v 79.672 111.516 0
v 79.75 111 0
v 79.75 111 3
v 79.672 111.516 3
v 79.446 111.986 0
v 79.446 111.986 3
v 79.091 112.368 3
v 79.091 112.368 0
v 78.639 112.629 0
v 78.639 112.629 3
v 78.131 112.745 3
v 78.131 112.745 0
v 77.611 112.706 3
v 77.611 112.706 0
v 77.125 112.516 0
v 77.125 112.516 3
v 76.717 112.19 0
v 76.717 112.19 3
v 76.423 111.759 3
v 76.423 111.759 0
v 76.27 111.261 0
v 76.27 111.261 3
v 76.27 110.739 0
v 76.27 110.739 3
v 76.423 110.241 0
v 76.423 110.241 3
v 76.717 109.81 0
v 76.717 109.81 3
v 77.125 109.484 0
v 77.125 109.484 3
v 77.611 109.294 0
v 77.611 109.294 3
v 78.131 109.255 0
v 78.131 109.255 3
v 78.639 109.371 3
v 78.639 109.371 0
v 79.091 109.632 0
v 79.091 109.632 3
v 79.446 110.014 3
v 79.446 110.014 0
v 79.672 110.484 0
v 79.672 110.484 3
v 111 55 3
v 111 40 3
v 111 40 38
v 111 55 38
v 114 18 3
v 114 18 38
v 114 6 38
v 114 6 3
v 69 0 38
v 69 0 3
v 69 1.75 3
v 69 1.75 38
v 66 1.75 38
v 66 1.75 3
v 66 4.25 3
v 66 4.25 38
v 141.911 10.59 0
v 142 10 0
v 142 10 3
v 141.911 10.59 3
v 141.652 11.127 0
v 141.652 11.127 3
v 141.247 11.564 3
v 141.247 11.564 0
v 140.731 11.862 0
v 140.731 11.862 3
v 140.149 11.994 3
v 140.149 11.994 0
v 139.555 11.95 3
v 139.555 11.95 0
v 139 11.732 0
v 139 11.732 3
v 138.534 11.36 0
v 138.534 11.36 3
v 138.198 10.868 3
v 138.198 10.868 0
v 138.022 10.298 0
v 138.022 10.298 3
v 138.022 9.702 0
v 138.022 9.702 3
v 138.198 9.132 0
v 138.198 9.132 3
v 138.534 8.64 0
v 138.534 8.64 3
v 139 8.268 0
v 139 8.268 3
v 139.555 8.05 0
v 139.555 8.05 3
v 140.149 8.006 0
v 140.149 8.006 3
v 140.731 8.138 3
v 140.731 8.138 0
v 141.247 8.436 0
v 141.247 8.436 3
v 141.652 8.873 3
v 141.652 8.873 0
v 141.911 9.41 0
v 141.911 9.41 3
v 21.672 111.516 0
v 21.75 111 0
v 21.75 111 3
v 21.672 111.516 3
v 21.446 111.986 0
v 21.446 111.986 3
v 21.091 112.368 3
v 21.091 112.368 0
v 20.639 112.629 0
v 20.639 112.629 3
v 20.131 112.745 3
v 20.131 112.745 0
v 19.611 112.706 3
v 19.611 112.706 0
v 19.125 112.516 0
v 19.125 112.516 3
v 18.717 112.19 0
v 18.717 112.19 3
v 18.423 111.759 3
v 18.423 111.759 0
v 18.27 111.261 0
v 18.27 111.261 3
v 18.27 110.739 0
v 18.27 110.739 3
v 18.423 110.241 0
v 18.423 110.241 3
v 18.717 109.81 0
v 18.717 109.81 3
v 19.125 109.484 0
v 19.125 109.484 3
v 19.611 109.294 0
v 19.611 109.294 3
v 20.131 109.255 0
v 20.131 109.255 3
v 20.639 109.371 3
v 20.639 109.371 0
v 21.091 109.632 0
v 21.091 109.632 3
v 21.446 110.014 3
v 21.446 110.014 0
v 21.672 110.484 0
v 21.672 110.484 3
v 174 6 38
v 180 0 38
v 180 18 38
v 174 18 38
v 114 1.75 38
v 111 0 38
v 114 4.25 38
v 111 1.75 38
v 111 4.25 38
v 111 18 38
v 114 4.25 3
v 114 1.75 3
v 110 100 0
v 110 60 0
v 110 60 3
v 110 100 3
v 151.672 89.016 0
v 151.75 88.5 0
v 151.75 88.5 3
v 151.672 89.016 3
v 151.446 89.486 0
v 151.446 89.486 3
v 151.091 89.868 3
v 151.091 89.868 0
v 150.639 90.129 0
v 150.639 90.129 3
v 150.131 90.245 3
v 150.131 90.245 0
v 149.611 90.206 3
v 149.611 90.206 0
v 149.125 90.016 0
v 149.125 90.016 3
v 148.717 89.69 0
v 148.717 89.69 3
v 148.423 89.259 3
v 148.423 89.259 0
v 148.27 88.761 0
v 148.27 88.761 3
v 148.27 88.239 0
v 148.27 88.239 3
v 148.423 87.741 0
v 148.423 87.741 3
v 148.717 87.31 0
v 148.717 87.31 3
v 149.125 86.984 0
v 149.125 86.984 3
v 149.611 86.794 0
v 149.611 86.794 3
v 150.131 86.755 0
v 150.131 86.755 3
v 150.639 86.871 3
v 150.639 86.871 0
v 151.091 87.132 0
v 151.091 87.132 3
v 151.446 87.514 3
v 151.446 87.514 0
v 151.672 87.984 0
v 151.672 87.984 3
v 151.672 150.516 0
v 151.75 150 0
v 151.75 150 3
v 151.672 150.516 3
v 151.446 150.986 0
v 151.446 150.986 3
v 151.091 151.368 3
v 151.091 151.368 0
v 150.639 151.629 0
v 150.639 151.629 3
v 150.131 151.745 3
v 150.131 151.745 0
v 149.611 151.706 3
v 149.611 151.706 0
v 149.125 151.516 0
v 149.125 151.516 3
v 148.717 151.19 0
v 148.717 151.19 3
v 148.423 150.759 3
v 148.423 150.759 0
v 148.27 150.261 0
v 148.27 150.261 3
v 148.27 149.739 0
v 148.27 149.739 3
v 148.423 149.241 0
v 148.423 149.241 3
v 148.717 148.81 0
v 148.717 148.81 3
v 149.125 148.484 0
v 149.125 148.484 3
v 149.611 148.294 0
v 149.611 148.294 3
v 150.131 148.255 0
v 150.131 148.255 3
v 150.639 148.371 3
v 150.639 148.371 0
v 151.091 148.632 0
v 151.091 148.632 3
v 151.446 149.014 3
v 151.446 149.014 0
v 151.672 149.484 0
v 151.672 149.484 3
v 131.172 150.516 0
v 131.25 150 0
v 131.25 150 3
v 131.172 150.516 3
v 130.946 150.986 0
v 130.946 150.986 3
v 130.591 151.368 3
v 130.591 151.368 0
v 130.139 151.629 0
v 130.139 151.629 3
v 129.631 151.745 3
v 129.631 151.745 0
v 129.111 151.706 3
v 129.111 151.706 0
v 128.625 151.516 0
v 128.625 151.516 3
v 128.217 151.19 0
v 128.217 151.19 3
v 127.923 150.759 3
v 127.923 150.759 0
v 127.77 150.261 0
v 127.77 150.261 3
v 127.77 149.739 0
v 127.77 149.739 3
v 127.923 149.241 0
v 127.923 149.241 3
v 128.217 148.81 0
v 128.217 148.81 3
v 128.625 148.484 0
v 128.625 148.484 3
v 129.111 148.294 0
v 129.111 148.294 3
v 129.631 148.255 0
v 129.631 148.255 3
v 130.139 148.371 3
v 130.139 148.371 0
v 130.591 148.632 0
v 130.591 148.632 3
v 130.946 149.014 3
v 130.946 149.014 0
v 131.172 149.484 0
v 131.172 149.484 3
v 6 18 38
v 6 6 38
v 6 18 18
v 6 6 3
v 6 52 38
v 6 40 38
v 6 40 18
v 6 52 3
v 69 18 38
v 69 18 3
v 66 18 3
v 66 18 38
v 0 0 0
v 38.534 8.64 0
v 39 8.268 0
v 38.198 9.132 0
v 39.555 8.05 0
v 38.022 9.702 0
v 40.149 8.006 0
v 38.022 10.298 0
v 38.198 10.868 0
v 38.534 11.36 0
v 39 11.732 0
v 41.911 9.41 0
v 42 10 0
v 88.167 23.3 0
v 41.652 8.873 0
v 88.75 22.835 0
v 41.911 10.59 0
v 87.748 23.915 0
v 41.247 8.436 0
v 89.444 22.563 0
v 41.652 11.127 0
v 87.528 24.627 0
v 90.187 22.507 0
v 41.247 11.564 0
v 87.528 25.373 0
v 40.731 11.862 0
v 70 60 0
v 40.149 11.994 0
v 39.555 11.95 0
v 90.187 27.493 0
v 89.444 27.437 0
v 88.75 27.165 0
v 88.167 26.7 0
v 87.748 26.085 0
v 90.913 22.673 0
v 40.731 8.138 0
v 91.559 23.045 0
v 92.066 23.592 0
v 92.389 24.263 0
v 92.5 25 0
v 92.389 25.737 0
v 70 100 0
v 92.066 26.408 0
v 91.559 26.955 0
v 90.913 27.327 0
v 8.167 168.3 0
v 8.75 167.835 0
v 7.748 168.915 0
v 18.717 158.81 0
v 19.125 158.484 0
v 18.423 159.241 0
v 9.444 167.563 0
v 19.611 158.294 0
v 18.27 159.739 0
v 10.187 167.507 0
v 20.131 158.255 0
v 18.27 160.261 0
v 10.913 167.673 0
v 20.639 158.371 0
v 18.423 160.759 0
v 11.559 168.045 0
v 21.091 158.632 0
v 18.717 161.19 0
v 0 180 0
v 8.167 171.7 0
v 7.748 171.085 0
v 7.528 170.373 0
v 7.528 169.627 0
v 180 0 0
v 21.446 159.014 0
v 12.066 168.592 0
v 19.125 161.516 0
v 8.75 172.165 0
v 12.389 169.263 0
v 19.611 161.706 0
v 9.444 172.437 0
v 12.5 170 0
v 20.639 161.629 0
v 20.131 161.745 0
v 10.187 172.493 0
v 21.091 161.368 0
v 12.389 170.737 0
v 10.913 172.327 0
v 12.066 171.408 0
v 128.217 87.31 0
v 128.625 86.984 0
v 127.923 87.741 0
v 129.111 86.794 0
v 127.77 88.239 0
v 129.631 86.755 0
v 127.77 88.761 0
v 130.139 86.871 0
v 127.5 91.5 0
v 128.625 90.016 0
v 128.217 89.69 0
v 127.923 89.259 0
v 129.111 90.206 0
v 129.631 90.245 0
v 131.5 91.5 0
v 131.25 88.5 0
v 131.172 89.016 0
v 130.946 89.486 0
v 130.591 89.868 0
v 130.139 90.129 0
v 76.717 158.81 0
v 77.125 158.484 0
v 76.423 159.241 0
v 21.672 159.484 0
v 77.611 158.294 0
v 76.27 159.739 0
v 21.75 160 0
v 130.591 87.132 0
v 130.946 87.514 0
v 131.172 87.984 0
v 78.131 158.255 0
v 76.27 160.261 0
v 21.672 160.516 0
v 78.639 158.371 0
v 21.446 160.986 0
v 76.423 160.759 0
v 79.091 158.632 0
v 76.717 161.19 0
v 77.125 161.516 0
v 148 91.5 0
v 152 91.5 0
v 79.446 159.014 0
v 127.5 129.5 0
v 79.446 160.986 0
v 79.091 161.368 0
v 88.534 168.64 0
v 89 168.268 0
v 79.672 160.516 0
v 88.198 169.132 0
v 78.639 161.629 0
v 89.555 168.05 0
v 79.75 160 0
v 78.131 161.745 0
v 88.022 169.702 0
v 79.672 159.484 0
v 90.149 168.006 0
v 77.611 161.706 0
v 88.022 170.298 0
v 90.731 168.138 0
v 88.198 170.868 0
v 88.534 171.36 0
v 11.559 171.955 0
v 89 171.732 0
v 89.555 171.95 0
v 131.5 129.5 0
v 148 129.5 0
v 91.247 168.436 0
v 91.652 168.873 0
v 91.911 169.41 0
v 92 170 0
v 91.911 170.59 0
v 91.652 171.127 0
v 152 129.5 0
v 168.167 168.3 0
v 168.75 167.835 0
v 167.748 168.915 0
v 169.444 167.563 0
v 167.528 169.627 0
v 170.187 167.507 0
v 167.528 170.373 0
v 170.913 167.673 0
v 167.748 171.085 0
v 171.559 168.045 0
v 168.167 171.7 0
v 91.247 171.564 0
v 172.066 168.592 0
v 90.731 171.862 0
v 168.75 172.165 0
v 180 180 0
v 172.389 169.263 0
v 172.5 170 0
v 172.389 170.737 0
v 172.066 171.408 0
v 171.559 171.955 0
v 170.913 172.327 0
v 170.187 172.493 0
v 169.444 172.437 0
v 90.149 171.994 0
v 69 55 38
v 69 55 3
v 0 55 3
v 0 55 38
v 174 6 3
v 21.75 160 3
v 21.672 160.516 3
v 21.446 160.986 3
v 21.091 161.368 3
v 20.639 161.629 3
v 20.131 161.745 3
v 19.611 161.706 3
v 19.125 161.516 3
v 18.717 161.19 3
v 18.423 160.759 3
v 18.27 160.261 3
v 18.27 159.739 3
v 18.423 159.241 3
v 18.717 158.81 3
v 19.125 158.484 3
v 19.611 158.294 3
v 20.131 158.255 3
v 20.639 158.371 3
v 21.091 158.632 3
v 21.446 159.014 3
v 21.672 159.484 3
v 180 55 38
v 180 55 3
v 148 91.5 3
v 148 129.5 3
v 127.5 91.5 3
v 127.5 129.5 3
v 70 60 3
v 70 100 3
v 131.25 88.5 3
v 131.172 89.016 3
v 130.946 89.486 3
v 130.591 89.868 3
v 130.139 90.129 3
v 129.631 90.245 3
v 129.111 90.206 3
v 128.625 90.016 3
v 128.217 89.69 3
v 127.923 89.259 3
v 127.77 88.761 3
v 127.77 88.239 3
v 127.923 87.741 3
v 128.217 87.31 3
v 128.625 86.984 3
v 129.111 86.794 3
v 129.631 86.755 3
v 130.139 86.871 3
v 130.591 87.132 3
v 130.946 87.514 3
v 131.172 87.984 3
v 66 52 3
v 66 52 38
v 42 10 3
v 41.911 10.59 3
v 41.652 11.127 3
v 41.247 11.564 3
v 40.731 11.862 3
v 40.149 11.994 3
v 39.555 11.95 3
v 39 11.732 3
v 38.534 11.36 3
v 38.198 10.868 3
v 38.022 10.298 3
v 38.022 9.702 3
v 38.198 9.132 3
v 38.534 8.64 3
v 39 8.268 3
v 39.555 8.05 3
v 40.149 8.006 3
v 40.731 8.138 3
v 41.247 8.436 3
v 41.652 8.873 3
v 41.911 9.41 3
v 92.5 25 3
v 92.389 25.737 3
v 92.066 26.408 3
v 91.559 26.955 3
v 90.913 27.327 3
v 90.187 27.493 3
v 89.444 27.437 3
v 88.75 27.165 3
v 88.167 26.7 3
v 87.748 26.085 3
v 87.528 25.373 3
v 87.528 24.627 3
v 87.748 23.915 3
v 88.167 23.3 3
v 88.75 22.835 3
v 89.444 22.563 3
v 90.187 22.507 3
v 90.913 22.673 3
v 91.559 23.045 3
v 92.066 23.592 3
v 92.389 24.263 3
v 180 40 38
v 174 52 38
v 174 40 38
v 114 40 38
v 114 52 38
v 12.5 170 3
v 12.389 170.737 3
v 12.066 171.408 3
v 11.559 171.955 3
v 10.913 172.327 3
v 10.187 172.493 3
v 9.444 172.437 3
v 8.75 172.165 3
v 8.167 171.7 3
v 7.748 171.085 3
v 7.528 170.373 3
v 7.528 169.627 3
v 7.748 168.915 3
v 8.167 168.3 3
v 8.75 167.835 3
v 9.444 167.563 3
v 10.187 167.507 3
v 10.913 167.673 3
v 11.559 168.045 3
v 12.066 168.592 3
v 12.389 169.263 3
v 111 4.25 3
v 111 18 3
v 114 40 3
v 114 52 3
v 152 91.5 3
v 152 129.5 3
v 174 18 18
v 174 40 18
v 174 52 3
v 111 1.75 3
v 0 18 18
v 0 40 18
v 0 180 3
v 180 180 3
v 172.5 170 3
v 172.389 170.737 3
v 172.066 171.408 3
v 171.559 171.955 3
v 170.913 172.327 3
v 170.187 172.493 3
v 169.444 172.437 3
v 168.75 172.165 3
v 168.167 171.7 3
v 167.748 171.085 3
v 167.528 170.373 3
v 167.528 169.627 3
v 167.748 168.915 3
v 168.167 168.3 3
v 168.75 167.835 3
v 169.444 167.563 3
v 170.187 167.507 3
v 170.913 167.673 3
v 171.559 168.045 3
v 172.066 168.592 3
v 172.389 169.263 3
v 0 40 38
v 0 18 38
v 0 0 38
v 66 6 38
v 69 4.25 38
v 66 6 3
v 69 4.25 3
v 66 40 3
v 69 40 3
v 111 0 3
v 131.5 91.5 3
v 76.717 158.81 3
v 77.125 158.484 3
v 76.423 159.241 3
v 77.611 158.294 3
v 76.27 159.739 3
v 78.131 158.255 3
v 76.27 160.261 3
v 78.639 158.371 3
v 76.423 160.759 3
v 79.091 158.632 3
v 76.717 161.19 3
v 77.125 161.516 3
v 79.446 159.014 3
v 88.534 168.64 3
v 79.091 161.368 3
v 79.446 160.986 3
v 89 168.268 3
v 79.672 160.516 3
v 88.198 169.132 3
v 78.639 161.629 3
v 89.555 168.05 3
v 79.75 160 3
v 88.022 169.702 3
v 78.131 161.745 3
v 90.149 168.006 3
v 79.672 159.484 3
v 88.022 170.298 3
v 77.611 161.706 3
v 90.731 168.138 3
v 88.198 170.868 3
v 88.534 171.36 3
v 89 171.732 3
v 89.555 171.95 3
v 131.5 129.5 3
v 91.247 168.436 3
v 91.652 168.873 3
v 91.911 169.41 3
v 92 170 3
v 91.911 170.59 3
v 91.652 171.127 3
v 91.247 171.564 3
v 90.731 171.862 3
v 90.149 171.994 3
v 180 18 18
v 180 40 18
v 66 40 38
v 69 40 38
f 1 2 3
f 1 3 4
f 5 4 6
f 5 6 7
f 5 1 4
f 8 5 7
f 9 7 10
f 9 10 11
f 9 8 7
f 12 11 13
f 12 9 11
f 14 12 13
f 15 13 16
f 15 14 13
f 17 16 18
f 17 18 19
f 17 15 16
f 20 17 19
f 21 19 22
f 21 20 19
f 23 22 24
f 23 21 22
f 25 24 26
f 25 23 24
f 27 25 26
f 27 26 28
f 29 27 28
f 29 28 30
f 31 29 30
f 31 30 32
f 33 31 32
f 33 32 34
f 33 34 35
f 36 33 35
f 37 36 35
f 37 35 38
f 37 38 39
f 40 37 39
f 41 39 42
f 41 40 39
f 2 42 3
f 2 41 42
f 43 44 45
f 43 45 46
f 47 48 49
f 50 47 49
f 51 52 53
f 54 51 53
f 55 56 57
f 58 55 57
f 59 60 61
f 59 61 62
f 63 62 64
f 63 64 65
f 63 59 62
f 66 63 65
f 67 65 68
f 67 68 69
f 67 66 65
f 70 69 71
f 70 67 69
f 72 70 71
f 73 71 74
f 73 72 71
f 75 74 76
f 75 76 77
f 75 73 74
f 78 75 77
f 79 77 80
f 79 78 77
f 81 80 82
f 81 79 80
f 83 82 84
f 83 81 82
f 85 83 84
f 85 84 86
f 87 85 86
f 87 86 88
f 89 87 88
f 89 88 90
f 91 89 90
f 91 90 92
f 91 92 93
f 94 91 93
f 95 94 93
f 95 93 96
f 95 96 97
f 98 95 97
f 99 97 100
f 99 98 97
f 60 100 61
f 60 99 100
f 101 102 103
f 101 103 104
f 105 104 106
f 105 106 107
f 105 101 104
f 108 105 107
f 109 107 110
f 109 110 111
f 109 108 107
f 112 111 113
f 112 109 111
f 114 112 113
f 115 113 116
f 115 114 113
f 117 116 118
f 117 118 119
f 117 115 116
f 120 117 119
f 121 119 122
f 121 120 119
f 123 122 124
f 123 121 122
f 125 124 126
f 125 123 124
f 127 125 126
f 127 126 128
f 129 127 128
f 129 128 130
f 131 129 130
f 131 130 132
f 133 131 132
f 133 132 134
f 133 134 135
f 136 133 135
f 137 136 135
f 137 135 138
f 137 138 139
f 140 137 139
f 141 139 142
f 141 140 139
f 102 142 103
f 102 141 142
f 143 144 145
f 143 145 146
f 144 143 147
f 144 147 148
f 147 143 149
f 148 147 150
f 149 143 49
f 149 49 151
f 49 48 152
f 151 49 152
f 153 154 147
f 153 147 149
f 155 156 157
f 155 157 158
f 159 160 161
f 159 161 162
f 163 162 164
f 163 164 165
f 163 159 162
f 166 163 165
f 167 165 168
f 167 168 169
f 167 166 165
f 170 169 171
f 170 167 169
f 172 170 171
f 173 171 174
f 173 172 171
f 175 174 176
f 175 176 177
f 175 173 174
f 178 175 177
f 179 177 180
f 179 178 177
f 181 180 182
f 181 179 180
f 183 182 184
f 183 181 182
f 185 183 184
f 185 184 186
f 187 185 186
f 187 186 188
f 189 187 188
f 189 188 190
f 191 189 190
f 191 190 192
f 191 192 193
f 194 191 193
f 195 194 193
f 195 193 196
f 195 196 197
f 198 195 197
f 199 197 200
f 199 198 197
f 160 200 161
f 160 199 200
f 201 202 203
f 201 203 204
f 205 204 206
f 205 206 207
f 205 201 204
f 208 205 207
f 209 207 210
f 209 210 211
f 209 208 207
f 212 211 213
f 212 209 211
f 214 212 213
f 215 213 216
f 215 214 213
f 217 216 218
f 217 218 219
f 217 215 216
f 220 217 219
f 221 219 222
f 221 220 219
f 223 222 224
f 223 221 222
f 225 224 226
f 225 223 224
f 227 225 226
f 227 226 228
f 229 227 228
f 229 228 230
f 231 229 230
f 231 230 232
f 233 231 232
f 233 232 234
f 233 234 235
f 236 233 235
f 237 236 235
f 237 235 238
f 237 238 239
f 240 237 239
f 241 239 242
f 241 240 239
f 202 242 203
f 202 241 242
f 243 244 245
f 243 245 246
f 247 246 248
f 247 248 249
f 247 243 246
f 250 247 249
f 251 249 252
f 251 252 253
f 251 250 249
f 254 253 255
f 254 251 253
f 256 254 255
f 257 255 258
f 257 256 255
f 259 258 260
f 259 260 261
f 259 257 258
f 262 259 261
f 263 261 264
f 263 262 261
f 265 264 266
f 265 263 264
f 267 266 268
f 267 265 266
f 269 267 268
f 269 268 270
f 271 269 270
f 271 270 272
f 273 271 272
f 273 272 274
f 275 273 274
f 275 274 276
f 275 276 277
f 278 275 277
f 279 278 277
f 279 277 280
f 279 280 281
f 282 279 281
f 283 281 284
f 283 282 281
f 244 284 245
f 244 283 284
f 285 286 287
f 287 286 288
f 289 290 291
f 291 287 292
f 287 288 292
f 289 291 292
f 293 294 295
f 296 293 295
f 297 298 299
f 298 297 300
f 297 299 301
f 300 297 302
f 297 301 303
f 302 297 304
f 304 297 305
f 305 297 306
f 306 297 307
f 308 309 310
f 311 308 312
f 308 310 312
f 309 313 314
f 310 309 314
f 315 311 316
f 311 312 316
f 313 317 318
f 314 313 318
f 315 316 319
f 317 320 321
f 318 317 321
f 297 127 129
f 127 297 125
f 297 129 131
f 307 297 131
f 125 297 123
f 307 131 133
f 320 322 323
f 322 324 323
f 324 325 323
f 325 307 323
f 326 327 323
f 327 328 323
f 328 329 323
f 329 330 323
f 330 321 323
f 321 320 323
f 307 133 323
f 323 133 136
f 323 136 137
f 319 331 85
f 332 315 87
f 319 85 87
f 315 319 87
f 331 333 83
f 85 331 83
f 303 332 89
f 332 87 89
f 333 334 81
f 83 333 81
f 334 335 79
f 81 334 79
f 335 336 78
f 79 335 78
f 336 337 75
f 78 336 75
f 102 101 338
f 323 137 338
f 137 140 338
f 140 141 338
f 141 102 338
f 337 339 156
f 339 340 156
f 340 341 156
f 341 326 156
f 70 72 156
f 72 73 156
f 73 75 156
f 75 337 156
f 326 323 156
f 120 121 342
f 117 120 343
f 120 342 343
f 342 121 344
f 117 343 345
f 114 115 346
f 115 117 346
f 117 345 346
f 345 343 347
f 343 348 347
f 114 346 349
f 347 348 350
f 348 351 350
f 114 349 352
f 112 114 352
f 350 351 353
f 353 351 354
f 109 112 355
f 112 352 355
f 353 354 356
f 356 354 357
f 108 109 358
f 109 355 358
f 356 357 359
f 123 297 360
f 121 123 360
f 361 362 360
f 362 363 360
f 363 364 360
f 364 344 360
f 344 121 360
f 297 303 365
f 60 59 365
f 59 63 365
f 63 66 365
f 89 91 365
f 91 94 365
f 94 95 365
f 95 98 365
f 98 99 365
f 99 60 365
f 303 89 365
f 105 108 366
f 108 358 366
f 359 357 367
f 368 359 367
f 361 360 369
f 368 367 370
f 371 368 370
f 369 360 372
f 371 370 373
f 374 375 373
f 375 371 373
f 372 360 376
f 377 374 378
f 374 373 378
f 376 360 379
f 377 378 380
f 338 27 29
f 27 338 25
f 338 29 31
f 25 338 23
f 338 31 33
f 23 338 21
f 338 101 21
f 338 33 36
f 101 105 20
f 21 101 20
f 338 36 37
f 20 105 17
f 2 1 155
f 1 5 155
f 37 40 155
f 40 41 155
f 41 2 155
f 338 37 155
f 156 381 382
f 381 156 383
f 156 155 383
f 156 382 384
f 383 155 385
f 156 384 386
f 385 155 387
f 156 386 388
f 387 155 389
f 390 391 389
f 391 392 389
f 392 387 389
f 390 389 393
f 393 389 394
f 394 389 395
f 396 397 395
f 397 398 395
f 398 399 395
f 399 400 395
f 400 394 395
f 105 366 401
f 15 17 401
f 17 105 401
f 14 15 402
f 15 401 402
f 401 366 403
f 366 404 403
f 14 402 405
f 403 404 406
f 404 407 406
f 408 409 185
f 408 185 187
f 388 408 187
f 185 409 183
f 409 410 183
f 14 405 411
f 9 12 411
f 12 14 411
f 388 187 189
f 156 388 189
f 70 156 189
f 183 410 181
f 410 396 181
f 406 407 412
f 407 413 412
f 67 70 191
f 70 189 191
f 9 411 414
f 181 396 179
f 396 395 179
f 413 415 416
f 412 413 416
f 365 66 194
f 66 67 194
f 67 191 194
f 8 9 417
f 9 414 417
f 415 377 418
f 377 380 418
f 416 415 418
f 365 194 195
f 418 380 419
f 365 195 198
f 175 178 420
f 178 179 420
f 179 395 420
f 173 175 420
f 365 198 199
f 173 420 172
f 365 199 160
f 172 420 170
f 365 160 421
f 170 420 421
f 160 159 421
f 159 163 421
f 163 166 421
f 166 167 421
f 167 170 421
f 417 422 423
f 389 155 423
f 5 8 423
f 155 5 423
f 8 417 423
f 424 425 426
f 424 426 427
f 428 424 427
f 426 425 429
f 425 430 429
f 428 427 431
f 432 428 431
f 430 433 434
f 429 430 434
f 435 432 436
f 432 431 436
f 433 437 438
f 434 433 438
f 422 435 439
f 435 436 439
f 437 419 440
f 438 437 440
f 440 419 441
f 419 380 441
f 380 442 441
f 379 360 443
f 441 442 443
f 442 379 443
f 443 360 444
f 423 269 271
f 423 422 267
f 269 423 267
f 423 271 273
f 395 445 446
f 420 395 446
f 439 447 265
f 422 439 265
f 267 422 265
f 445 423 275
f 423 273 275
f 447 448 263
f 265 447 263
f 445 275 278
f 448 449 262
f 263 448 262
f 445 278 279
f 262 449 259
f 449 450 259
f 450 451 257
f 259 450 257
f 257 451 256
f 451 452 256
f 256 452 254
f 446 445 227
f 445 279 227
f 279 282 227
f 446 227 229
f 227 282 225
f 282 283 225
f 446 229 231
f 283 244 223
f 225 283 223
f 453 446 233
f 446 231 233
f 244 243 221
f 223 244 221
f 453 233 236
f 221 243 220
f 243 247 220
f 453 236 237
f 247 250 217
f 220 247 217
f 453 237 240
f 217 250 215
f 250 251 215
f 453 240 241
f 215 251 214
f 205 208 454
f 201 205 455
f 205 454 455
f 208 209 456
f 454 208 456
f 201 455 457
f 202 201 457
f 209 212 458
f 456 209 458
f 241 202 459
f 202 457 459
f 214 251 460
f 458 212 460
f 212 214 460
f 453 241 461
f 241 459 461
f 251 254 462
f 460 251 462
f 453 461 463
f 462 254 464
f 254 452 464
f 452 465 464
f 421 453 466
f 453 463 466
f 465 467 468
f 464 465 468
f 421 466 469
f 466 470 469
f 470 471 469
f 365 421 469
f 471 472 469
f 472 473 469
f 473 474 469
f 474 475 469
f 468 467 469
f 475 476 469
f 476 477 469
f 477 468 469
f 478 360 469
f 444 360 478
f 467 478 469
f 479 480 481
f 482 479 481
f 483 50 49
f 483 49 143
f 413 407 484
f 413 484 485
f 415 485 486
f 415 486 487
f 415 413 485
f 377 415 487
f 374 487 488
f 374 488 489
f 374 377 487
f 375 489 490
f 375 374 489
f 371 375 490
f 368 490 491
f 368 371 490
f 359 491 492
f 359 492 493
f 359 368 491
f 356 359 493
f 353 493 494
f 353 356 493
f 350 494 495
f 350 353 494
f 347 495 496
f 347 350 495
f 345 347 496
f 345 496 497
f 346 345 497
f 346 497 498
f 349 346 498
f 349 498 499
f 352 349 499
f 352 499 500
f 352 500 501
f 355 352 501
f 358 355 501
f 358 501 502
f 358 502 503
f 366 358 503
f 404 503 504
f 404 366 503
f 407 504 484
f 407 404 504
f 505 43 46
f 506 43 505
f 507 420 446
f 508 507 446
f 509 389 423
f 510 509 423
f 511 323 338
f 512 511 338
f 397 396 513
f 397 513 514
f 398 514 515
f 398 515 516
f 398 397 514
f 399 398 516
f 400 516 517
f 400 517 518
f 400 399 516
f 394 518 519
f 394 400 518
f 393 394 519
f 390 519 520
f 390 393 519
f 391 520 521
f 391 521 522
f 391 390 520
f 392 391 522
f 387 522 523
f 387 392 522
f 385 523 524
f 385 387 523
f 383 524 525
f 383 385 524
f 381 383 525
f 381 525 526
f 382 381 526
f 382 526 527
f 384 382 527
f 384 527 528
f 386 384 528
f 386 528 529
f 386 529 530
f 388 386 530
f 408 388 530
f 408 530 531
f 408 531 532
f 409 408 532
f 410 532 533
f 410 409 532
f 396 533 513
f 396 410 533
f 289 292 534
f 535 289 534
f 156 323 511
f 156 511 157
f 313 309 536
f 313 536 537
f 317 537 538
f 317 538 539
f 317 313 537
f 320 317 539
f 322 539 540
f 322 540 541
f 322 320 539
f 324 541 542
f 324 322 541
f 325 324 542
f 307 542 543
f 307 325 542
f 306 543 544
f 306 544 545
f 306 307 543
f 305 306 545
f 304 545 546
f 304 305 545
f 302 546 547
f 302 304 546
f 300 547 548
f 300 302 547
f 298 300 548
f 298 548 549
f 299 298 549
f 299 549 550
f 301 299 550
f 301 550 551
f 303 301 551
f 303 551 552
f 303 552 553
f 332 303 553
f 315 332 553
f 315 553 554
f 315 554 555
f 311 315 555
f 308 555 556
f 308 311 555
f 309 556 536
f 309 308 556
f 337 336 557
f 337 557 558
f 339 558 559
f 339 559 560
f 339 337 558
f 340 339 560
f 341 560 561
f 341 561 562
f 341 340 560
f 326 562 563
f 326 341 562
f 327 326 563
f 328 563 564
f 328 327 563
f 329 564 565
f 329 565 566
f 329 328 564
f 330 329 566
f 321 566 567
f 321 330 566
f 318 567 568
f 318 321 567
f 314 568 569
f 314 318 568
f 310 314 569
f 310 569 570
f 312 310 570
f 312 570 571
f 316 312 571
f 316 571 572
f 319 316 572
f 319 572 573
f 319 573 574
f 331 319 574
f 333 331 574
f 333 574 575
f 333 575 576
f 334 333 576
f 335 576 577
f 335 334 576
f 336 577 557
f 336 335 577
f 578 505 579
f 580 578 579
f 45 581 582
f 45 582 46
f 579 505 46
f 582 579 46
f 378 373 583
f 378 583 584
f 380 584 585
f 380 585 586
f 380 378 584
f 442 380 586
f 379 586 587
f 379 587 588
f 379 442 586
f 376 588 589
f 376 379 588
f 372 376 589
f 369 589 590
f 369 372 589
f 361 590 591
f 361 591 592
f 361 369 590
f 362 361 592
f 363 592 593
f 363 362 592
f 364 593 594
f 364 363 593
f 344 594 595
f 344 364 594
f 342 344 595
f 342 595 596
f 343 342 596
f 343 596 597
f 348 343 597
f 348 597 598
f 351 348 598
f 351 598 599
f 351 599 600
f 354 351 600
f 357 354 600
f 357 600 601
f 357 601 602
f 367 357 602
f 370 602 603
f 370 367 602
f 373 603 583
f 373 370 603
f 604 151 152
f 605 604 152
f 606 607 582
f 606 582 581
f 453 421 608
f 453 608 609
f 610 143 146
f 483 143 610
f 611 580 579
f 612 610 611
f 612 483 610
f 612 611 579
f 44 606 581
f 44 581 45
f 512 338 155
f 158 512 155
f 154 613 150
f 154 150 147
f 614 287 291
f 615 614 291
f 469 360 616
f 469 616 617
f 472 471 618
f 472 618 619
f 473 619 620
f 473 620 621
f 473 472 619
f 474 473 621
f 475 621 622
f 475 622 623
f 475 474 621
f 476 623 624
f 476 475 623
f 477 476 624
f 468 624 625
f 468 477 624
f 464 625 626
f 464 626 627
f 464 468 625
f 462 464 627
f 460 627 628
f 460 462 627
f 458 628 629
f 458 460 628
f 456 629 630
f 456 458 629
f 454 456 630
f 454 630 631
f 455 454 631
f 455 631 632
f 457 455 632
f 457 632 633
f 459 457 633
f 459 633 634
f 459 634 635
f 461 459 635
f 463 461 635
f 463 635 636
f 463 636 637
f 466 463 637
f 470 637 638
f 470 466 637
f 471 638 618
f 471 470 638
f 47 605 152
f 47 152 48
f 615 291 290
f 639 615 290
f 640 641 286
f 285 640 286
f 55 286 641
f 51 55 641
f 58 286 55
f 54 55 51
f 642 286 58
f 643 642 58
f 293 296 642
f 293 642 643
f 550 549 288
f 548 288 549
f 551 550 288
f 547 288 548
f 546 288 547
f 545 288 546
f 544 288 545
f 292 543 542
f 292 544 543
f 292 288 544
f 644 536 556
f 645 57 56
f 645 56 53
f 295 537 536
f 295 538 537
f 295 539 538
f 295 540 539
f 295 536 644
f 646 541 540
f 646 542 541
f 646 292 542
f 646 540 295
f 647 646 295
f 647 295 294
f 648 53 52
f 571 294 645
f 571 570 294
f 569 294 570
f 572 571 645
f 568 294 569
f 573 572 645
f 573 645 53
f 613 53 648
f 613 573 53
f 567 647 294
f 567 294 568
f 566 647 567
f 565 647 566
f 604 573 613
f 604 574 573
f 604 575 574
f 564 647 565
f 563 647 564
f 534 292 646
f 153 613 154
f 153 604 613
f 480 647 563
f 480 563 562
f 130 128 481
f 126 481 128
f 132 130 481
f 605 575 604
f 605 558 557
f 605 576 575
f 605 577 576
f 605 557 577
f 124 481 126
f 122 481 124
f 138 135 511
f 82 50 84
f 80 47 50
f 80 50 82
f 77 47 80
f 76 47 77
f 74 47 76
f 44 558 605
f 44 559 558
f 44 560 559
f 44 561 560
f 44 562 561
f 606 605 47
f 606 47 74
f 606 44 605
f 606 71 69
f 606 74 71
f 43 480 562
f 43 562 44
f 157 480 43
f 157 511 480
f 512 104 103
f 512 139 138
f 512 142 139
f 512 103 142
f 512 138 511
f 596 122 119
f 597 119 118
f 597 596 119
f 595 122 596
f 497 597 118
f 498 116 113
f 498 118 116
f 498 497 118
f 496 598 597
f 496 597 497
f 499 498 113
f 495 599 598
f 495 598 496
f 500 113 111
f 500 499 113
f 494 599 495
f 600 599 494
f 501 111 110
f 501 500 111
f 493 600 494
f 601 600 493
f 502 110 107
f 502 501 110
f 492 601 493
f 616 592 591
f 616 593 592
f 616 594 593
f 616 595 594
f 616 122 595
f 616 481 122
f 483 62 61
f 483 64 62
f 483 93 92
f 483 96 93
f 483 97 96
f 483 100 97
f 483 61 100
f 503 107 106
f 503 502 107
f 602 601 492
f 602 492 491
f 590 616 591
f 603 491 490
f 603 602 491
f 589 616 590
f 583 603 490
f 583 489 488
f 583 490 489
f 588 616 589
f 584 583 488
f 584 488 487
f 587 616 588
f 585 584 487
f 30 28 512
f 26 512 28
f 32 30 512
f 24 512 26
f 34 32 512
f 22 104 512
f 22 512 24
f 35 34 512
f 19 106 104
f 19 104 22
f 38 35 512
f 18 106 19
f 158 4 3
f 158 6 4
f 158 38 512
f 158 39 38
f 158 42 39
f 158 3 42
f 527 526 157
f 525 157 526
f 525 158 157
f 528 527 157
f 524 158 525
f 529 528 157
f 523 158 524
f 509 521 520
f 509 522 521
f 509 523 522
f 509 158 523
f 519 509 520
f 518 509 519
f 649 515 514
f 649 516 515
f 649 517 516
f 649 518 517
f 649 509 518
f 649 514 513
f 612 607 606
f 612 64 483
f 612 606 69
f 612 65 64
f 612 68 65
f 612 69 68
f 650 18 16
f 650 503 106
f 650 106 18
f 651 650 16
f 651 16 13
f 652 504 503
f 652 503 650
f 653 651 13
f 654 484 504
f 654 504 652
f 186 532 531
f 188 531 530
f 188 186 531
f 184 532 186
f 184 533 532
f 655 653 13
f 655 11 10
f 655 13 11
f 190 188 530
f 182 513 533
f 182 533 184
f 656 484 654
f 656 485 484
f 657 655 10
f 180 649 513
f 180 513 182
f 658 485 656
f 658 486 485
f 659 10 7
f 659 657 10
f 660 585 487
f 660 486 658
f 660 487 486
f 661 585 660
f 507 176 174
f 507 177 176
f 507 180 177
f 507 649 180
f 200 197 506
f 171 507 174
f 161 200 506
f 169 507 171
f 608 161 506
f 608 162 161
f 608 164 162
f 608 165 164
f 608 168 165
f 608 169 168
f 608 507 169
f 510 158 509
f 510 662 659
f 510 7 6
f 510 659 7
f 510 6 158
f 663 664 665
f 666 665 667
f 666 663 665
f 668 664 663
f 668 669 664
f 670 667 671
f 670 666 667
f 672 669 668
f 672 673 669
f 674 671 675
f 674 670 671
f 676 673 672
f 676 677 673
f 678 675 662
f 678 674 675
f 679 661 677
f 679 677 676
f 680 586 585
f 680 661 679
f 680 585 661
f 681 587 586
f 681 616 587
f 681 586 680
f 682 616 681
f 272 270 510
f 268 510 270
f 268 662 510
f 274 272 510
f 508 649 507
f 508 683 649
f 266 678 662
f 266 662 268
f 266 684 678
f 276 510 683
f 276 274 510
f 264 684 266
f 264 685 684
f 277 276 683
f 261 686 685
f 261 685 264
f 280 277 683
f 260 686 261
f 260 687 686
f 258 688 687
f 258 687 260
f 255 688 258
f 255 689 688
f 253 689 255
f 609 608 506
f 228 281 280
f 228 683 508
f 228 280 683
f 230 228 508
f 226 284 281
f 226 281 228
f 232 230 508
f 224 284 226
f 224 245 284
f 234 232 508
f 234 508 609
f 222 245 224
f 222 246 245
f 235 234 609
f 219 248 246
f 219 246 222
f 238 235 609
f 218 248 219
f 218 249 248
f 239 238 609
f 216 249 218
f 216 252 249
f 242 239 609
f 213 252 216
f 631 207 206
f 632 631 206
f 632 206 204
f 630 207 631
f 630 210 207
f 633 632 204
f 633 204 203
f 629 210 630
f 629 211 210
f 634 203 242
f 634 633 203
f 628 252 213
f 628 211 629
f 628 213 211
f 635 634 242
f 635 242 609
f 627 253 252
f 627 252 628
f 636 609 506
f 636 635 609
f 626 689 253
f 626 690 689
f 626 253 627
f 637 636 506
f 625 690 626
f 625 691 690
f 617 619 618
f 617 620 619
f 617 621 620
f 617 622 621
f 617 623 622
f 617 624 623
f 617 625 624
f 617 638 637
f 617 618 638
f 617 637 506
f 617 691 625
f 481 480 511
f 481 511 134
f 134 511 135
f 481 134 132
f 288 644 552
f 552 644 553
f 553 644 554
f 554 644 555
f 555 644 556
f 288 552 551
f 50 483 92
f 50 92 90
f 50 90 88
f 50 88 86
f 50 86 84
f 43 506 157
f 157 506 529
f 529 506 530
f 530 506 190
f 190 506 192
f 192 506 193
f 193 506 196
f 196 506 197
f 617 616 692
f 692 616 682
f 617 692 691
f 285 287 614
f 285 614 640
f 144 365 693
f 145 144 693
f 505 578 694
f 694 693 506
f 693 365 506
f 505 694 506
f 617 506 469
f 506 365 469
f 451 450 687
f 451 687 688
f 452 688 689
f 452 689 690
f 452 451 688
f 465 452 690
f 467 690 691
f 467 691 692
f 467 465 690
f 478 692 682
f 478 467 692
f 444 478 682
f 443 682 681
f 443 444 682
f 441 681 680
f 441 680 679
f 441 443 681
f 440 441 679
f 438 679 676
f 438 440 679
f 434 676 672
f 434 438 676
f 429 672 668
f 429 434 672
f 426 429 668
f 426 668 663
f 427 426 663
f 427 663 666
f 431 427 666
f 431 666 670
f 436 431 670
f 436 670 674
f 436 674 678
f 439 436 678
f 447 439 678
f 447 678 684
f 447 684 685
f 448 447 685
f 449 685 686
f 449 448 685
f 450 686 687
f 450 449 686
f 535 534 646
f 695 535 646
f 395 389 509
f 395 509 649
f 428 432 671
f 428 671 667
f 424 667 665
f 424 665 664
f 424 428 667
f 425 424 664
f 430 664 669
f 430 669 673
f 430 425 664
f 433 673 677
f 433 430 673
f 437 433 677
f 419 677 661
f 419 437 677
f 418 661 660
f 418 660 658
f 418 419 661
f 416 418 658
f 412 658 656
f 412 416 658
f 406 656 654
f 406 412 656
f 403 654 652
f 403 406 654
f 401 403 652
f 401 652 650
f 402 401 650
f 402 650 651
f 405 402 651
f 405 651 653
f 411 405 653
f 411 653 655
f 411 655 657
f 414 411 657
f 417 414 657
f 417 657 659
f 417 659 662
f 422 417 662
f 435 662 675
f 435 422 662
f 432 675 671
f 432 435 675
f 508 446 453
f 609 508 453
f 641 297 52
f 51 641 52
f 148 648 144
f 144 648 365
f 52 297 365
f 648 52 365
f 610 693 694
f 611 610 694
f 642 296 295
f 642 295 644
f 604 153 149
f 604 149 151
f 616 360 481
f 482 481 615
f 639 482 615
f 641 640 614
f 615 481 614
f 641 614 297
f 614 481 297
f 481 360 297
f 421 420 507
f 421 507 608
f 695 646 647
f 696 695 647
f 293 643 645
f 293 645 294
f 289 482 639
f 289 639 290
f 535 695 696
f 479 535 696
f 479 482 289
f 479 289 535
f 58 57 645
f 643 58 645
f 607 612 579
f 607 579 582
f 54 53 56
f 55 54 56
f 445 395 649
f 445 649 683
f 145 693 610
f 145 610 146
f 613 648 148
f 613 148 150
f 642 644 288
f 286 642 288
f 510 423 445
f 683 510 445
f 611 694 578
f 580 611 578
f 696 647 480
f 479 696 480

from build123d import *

# Parameters (mm, degrees)
SKETCH_W     = 180
SKETCH_H     = 180
SKETCH_R     = 2
SKETCH_R_2   = 1.75
SKETCH_R_3   = 2.5
SKETCH_W_2   = 40
SKETCH_H_2   = 40
SKETCH_W_3   = 4
SKETCH_H_3   = 38
PAD_DEPTH    = 3
PAD001_DEPTH = 35
SKETCH002_W  = 22
SKETCH002_H  = 20
POCKET_DEPTH = 200


with BuildPart() as part:
    # Sketch → Pad (new body)
    with BuildSketch(Plane.XY):
        with Locations((90, 90)):
            Rectangle(SKETCH_W, SKETCH_H)
        with Locations((40, 10)):
            Circle(SKETCH_R, mode=Mode.SUBTRACT)
        with Locations((140, 10)):
            Circle(SKETCH_R, mode=Mode.SUBTRACT)
        with Locations((90, 170)):
            Circle(SKETCH_R, mode=Mode.SUBTRACT)
        with Locations((20, 160)):
            Circle(SKETCH_R_2, mode=Mode.SUBTRACT)
        with Locations((78, 160)):
            Circle(SKETCH_R_2, mode=Mode.SUBTRACT)
        with Locations((20, 111)):
            Circle(SKETCH_R_2, mode=Mode.SUBTRACT)
        with Locations((78, 111)):
            Circle(SKETCH_R_2, mode=Mode.SUBTRACT)
        with Locations((90, 25)):
            Circle(SKETCH_R_3, mode=Mode.SUBTRACT)
        with Locations((10, 170)):
            Circle(SKETCH_R_3, mode=Mode.SUBTRACT)
        with Locations((170, 170)):
            Circle(SKETCH_R_3, mode=Mode.SUBTRACT)
        with Locations((129.5, 150)):
            Circle(SKETCH_R_2, mode=Mode.SUBTRACT)
        with Locations((150, 150)):
            Circle(SKETCH_R_2, mode=Mode.SUBTRACT)
        with Locations((129.5, 88.5)):
            Circle(SKETCH_R_2, mode=Mode.SUBTRACT)
        with Locations((150, 88.5)):
            Circle(SKETCH_R_2, mode=Mode.SUBTRACT)
        with Locations((90, 80)):
            Rectangle(SKETCH_W_2, SKETCH_H_2, mode=Mode.SUBTRACT)
        with Locations((129.5, 110.5)):
            Rectangle(SKETCH_W_3, SKETCH_H_3, mode=Mode.SUBTRACT)
        with Locations((150, 110.5)):
            Rectangle(SKETCH_W_3, SKETCH_H_3, mode=Mode.SUBTRACT)
    extrude(amount=PAD_DEPTH)

    # Sketch001 → Pad001 (join)
    with BuildSketch(Plane.XY.offset(3)):
        Polygon((0, 0), (69, 0), (69, 1.75), (66, 1.75), (66, 4.25), (69, 4.25), (69, 18), (66, 18), (66, 6), (6, 6), (6, 52), (66, 52), (66, 40), (69, 40), (69, 55), (0, 55), align=None)
        Polygon((180, 0), (111, 0), (111, 1.75), (114, 1.75), (114, 4.25), (111, 4.25), (111, 18), (114, 18), (114, 6), (174, 6), (174, 52), (114, 52), (114, 40), (111, 40), (111, 55), (180, 55), align=None)
    extrude(amount=PAD001_DEPTH)

    # Sketch002 (on Face10 of Pad001) → Pocket (cut)
    with BuildSketch(Plane.YZ.offset(180)):
        with Locations((29, 28)):
            Rectangle(SKETCH002_W, SKETCH002_H)
    extrude(amount=-POCKET_DEPTH, mode=Mode.SUBTRACT)


solid = part.part
